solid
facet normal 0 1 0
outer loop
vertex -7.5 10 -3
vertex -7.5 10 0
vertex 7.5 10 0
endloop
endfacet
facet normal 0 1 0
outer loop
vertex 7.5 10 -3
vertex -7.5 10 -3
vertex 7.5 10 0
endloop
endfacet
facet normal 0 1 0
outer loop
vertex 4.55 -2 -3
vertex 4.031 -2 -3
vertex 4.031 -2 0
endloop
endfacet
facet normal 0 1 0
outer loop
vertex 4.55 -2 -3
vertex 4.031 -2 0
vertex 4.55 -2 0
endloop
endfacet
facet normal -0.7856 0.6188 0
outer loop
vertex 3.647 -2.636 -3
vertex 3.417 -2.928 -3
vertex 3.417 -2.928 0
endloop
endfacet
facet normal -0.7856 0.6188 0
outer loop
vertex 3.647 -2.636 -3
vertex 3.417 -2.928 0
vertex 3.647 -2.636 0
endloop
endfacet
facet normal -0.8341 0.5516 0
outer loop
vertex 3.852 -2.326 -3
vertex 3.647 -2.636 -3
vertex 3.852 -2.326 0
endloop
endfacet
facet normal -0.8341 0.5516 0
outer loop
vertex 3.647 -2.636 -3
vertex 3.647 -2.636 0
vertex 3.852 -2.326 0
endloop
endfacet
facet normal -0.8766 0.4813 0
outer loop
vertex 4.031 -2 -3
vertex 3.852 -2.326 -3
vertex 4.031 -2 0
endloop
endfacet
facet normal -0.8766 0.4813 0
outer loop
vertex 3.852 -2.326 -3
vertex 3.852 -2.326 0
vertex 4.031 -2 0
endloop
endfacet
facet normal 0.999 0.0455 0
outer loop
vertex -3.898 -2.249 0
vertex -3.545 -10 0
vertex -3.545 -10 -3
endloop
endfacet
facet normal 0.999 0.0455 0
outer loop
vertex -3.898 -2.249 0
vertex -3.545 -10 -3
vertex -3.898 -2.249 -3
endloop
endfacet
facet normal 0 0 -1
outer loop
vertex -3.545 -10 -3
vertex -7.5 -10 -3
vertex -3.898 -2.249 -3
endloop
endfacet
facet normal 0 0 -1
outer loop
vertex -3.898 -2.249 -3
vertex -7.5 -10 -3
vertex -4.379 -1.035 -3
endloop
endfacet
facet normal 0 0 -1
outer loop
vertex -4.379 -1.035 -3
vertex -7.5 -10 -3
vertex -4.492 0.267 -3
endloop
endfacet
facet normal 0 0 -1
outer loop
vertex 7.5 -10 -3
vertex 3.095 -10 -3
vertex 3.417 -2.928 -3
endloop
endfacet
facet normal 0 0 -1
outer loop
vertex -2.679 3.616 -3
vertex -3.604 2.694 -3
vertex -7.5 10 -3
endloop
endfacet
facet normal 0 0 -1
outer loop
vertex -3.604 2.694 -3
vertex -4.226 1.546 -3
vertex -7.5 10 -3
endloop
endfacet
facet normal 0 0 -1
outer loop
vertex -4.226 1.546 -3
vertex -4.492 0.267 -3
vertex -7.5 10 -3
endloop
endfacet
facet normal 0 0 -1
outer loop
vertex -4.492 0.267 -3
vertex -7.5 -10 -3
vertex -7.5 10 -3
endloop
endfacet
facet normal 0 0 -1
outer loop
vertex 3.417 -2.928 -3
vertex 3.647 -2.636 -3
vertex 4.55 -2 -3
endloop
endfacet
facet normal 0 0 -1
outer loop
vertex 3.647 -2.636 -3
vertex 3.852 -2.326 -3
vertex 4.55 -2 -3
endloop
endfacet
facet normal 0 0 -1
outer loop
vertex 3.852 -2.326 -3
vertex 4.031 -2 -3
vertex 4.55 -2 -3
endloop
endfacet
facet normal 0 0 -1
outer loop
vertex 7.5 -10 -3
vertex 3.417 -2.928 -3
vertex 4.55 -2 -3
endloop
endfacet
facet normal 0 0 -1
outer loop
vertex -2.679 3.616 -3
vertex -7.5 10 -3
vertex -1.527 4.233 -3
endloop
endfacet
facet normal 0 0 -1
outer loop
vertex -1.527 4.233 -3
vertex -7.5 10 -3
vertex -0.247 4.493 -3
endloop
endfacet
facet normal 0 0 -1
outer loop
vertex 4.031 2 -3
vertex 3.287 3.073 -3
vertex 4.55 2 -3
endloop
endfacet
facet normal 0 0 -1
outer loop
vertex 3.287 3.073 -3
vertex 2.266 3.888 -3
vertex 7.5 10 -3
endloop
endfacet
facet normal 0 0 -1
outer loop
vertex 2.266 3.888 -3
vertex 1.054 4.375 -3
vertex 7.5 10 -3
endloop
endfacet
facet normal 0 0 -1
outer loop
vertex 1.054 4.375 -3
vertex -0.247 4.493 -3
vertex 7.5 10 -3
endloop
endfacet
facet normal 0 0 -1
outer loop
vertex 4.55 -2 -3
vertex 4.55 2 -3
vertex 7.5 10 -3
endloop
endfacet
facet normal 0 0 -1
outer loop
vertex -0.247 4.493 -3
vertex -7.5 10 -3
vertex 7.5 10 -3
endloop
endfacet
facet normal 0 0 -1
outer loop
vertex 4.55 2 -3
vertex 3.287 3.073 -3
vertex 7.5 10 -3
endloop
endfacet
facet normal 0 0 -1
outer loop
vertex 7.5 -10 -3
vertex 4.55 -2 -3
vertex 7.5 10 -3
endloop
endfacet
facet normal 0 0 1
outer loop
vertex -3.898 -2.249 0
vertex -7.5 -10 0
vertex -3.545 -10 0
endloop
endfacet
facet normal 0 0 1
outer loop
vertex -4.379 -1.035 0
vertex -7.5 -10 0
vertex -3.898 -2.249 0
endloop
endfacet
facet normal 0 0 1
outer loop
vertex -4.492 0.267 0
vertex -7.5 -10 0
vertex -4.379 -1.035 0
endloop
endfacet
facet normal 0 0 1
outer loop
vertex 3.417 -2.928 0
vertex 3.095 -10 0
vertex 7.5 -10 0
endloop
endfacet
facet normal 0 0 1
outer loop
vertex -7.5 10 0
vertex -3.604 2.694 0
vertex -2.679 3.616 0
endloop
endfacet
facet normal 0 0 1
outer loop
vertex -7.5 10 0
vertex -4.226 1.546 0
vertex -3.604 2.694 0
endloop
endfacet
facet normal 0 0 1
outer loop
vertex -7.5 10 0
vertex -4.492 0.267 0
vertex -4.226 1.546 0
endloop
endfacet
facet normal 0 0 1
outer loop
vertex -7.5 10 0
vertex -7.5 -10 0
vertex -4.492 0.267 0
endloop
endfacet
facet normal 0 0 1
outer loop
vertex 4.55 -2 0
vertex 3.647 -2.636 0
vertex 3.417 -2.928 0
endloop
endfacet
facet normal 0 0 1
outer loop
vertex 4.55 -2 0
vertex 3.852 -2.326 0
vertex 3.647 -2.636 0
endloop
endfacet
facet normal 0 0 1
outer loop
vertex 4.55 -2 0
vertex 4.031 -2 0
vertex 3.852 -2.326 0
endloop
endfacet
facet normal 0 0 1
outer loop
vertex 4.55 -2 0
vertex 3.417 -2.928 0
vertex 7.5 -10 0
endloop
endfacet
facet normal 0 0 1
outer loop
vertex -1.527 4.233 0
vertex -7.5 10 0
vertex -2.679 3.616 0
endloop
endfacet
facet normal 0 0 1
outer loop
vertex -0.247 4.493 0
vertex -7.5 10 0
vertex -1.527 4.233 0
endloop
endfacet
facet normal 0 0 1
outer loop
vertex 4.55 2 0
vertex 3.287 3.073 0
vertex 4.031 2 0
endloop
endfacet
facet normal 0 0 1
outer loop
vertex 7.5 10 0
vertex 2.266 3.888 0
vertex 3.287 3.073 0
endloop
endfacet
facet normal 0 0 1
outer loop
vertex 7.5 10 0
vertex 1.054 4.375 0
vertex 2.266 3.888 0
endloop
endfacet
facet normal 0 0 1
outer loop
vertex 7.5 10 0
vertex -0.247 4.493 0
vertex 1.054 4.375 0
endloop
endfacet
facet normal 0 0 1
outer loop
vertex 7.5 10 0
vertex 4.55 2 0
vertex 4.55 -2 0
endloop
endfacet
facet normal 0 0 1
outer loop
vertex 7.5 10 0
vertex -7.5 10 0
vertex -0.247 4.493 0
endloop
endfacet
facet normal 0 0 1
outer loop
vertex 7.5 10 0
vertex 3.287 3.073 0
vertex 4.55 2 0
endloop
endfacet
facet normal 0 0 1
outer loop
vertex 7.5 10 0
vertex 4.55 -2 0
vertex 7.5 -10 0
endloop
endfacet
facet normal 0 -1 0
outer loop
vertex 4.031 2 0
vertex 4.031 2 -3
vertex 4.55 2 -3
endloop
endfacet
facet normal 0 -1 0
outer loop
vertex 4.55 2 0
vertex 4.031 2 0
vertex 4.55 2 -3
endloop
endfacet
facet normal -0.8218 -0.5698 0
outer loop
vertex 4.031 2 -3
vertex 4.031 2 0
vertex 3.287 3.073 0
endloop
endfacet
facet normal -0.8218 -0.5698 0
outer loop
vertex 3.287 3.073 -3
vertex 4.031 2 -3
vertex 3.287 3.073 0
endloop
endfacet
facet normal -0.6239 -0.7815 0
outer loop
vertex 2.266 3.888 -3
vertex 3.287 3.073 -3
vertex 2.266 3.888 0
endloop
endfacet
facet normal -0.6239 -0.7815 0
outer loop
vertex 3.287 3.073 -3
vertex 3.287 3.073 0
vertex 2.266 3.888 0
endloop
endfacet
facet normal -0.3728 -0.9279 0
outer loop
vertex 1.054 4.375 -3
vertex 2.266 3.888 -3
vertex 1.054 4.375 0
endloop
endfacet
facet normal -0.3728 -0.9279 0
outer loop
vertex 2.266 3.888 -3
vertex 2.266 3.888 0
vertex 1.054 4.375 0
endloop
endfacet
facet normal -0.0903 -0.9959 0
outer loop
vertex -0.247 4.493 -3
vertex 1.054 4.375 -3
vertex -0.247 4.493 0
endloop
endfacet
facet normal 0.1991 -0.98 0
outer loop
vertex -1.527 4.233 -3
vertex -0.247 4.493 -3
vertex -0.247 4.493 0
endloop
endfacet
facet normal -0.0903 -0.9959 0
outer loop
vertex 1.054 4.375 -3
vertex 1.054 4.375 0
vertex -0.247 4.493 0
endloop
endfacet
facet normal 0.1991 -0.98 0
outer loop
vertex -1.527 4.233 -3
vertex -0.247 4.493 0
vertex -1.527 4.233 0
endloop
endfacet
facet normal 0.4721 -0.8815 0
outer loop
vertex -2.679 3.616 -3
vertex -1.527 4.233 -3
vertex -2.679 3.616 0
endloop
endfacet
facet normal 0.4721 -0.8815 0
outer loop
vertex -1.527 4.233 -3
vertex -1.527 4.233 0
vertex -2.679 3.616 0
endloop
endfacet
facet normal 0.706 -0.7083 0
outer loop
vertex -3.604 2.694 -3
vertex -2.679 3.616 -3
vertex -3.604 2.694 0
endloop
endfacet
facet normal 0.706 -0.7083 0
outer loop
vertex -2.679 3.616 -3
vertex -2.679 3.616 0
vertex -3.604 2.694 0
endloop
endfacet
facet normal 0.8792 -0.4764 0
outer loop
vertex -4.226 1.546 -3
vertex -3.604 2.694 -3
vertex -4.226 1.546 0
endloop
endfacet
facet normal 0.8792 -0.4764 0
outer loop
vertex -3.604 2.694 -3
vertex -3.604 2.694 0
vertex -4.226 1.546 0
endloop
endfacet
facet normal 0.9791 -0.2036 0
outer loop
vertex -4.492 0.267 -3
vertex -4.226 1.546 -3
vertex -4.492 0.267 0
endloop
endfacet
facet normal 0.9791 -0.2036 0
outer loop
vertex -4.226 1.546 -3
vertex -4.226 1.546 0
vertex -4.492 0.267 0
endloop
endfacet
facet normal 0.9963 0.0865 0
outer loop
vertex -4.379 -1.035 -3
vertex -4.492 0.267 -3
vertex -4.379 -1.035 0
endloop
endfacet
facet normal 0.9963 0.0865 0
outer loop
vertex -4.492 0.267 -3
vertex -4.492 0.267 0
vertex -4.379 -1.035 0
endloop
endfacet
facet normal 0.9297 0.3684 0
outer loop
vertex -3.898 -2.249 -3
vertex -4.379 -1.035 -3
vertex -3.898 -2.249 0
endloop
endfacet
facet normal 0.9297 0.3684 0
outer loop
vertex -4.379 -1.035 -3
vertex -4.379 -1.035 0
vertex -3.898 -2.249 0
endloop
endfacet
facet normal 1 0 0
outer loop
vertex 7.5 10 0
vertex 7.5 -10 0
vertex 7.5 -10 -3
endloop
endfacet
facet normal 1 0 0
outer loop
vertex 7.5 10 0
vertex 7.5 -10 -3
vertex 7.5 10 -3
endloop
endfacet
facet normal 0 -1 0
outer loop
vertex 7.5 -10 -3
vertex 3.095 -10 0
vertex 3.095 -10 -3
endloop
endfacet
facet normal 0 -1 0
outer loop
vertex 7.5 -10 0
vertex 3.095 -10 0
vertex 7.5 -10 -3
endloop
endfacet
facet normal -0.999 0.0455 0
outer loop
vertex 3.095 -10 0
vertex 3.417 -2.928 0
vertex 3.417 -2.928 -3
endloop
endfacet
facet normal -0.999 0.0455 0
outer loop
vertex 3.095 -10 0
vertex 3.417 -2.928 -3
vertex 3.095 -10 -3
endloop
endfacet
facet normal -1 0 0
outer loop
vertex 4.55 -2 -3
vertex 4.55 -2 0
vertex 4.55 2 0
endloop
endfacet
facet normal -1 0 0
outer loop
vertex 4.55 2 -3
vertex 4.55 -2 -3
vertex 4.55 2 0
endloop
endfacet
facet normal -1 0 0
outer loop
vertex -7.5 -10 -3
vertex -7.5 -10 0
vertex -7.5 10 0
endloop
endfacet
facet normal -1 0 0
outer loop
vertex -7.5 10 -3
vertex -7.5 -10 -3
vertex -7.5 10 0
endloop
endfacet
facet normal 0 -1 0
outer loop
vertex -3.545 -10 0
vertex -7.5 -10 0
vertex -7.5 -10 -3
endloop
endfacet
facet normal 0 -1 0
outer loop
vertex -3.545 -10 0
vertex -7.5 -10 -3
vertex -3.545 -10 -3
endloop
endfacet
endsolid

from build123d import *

# Parameters (mm, degrees)
SKETCH001_W     = 15
SKETCH001_H     = 20
PAD_DEPTH       = 3
SKETCH_R        = 4.5
POCKET_DEPTH    = 3
SKETCH002_W     = 2
SKETCH002_H     = 4
POCKET001_DEPTH = 3
POCKET002_DEPTH = 3


with BuildPart() as part:
    # Sketch001 → Pad (new body)
    with BuildSketch(Plane.XY):
        Rectangle(SKETCH001_W, SKETCH001_H)
    extrude(amount=-PAD_DEPTH)

    # Sketch → Pocket (cut)
    with BuildSketch(Plane.XY):
        Circle(SKETCH_R)
    extrude(amount=-POCKET_DEPTH, mode=Mode.SUBTRACT)

    # Sketch002 (on Face4 of Pocket) → Pocket001 (cut)
    with BuildSketch(Plane.XY):
        with Locations((3.55, 0)):
            Rectangle(SKETCH002_W, SKETCH002_H)
    extrude(amount=-POCKET001_DEPTH, mode=Mode.SUBTRACT)

    # Sketch003 (on Face4 of Pocket001) → Pocket002 (cut)
    with BuildSketch(Plane.XY):
        Polygon((3.05, -11), (-3.5, -11), (-4, 0), (3.55, 0), align=None)
    extrude(amount=-POCKET002_DEPTH, mode=Mode.SUBTRACT)


solid = part.part
